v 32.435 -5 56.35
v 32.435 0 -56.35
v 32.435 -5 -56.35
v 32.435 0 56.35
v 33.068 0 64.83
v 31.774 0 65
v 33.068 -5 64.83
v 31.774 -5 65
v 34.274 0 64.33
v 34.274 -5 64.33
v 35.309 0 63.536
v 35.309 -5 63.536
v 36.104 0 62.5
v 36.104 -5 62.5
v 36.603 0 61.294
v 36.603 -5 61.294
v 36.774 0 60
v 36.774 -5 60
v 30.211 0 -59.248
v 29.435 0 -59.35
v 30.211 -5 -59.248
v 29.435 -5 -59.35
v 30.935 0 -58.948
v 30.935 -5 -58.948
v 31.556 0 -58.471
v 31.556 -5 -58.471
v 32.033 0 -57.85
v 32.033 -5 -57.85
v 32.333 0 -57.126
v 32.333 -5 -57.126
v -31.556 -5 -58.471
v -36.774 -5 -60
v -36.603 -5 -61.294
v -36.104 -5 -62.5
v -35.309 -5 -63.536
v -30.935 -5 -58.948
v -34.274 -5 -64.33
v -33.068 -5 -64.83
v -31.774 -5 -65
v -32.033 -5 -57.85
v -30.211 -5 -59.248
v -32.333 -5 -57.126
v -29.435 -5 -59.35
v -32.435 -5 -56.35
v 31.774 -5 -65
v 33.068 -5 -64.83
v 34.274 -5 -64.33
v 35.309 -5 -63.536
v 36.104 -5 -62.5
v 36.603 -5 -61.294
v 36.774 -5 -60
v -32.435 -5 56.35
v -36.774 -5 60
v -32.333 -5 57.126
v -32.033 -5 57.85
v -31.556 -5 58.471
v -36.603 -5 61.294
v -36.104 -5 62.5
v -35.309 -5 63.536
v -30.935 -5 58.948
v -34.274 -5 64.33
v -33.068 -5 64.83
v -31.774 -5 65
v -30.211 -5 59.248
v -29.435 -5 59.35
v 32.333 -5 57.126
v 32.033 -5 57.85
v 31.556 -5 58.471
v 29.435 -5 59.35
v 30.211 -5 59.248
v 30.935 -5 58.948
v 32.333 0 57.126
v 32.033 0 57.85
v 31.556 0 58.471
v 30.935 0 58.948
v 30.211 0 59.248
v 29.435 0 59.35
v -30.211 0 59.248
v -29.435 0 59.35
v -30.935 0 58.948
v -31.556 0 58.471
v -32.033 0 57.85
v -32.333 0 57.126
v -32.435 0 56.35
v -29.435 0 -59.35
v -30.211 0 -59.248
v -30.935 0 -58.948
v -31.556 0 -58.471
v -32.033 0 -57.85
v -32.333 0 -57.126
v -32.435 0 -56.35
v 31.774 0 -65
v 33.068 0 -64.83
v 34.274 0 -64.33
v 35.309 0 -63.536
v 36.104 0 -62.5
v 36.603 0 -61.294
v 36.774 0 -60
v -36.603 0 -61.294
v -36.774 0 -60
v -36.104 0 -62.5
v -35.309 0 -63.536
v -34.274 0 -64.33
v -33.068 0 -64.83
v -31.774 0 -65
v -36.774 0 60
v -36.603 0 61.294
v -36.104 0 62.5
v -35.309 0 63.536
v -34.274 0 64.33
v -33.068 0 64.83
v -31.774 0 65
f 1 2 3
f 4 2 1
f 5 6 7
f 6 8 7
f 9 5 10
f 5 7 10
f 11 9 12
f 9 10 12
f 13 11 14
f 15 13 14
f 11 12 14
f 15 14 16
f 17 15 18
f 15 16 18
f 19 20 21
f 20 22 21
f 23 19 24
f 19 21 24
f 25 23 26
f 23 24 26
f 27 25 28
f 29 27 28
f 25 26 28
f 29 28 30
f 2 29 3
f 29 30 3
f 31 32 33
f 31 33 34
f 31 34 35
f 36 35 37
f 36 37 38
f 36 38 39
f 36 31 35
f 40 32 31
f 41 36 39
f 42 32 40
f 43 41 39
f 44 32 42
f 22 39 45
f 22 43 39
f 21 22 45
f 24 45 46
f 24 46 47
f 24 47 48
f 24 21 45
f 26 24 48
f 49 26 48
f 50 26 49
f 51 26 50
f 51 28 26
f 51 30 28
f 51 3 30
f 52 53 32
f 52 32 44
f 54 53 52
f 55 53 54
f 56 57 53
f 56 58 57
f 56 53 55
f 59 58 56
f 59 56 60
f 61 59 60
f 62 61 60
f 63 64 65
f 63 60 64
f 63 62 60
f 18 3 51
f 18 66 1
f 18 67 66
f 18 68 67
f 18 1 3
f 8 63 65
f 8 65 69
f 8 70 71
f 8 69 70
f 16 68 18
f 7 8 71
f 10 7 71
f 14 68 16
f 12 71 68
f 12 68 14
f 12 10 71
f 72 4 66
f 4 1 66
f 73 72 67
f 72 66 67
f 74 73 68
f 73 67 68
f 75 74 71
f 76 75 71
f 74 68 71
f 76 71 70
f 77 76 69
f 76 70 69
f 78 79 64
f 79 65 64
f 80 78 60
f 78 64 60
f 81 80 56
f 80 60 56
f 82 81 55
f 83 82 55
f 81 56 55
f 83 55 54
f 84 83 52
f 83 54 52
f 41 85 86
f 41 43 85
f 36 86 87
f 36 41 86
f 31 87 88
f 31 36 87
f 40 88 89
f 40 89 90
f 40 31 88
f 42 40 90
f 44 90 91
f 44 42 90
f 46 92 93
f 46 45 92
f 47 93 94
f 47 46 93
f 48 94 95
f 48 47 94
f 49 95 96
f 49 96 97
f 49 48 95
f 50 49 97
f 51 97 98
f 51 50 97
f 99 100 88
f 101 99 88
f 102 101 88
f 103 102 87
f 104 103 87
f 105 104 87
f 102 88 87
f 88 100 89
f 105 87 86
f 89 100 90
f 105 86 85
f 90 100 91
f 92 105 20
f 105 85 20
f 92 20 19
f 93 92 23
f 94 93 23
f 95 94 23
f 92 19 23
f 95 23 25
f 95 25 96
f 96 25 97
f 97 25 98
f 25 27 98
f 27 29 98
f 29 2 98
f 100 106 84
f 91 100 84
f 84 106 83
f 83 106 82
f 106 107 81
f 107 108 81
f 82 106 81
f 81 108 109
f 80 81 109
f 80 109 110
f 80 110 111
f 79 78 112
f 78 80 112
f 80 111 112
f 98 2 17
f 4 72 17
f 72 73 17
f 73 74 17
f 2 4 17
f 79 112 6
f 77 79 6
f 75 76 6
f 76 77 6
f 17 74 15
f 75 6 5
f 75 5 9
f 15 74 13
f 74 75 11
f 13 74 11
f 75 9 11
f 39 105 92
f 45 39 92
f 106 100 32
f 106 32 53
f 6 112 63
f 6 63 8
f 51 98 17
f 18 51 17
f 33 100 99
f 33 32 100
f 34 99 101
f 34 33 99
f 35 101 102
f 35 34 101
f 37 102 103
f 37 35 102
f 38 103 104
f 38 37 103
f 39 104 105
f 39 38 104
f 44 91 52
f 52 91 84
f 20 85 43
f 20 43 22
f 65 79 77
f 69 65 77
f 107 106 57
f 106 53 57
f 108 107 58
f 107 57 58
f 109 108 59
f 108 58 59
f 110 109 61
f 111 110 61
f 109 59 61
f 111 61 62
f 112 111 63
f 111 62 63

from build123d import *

# Parameters (mm, degrees)
F0_W     = 73.547
F0_H     = 130
F0_W_2   = 64.87
F0_H_2   = 118.7
F1_DEPTH = 5
F2_R     = 5
F3_R     = 3


with BuildPart() as f1:
    # F0 (on Front) → F1 (new body)
    with BuildSketch(Plane.XZ):
        Rectangle(F0_W, F0_H)
        Rectangle(F0_W_2, F0_H_2, mode=Mode.SUBTRACT)
    extrude(amount=F1_DEPTH)

    # F2
    f2_edges = [f1.edges().sort_by_distance(p)[0] for p in [
        (-36.7735, -2.5, 65),
        (36.7735, -2.5, 65),
        (36.7735, -2.5, -65),
        (-36.7735, -2.5, -65),
    ]]
    fillet(f2_edges, radius=F2_R)

    # F3
    f3_edges = [f1.edges().sort_by_distance(p)[0] for p in [
        (32.435, -2.5, 59.35),
        (32.435, -2.5, -59.35),
        (-32.435, -2.5, 59.35),
        (-32.435, -2.5, -59.35),
    ]]
    fillet(f3_edges, radius=F3_R)


solid = f1.part
